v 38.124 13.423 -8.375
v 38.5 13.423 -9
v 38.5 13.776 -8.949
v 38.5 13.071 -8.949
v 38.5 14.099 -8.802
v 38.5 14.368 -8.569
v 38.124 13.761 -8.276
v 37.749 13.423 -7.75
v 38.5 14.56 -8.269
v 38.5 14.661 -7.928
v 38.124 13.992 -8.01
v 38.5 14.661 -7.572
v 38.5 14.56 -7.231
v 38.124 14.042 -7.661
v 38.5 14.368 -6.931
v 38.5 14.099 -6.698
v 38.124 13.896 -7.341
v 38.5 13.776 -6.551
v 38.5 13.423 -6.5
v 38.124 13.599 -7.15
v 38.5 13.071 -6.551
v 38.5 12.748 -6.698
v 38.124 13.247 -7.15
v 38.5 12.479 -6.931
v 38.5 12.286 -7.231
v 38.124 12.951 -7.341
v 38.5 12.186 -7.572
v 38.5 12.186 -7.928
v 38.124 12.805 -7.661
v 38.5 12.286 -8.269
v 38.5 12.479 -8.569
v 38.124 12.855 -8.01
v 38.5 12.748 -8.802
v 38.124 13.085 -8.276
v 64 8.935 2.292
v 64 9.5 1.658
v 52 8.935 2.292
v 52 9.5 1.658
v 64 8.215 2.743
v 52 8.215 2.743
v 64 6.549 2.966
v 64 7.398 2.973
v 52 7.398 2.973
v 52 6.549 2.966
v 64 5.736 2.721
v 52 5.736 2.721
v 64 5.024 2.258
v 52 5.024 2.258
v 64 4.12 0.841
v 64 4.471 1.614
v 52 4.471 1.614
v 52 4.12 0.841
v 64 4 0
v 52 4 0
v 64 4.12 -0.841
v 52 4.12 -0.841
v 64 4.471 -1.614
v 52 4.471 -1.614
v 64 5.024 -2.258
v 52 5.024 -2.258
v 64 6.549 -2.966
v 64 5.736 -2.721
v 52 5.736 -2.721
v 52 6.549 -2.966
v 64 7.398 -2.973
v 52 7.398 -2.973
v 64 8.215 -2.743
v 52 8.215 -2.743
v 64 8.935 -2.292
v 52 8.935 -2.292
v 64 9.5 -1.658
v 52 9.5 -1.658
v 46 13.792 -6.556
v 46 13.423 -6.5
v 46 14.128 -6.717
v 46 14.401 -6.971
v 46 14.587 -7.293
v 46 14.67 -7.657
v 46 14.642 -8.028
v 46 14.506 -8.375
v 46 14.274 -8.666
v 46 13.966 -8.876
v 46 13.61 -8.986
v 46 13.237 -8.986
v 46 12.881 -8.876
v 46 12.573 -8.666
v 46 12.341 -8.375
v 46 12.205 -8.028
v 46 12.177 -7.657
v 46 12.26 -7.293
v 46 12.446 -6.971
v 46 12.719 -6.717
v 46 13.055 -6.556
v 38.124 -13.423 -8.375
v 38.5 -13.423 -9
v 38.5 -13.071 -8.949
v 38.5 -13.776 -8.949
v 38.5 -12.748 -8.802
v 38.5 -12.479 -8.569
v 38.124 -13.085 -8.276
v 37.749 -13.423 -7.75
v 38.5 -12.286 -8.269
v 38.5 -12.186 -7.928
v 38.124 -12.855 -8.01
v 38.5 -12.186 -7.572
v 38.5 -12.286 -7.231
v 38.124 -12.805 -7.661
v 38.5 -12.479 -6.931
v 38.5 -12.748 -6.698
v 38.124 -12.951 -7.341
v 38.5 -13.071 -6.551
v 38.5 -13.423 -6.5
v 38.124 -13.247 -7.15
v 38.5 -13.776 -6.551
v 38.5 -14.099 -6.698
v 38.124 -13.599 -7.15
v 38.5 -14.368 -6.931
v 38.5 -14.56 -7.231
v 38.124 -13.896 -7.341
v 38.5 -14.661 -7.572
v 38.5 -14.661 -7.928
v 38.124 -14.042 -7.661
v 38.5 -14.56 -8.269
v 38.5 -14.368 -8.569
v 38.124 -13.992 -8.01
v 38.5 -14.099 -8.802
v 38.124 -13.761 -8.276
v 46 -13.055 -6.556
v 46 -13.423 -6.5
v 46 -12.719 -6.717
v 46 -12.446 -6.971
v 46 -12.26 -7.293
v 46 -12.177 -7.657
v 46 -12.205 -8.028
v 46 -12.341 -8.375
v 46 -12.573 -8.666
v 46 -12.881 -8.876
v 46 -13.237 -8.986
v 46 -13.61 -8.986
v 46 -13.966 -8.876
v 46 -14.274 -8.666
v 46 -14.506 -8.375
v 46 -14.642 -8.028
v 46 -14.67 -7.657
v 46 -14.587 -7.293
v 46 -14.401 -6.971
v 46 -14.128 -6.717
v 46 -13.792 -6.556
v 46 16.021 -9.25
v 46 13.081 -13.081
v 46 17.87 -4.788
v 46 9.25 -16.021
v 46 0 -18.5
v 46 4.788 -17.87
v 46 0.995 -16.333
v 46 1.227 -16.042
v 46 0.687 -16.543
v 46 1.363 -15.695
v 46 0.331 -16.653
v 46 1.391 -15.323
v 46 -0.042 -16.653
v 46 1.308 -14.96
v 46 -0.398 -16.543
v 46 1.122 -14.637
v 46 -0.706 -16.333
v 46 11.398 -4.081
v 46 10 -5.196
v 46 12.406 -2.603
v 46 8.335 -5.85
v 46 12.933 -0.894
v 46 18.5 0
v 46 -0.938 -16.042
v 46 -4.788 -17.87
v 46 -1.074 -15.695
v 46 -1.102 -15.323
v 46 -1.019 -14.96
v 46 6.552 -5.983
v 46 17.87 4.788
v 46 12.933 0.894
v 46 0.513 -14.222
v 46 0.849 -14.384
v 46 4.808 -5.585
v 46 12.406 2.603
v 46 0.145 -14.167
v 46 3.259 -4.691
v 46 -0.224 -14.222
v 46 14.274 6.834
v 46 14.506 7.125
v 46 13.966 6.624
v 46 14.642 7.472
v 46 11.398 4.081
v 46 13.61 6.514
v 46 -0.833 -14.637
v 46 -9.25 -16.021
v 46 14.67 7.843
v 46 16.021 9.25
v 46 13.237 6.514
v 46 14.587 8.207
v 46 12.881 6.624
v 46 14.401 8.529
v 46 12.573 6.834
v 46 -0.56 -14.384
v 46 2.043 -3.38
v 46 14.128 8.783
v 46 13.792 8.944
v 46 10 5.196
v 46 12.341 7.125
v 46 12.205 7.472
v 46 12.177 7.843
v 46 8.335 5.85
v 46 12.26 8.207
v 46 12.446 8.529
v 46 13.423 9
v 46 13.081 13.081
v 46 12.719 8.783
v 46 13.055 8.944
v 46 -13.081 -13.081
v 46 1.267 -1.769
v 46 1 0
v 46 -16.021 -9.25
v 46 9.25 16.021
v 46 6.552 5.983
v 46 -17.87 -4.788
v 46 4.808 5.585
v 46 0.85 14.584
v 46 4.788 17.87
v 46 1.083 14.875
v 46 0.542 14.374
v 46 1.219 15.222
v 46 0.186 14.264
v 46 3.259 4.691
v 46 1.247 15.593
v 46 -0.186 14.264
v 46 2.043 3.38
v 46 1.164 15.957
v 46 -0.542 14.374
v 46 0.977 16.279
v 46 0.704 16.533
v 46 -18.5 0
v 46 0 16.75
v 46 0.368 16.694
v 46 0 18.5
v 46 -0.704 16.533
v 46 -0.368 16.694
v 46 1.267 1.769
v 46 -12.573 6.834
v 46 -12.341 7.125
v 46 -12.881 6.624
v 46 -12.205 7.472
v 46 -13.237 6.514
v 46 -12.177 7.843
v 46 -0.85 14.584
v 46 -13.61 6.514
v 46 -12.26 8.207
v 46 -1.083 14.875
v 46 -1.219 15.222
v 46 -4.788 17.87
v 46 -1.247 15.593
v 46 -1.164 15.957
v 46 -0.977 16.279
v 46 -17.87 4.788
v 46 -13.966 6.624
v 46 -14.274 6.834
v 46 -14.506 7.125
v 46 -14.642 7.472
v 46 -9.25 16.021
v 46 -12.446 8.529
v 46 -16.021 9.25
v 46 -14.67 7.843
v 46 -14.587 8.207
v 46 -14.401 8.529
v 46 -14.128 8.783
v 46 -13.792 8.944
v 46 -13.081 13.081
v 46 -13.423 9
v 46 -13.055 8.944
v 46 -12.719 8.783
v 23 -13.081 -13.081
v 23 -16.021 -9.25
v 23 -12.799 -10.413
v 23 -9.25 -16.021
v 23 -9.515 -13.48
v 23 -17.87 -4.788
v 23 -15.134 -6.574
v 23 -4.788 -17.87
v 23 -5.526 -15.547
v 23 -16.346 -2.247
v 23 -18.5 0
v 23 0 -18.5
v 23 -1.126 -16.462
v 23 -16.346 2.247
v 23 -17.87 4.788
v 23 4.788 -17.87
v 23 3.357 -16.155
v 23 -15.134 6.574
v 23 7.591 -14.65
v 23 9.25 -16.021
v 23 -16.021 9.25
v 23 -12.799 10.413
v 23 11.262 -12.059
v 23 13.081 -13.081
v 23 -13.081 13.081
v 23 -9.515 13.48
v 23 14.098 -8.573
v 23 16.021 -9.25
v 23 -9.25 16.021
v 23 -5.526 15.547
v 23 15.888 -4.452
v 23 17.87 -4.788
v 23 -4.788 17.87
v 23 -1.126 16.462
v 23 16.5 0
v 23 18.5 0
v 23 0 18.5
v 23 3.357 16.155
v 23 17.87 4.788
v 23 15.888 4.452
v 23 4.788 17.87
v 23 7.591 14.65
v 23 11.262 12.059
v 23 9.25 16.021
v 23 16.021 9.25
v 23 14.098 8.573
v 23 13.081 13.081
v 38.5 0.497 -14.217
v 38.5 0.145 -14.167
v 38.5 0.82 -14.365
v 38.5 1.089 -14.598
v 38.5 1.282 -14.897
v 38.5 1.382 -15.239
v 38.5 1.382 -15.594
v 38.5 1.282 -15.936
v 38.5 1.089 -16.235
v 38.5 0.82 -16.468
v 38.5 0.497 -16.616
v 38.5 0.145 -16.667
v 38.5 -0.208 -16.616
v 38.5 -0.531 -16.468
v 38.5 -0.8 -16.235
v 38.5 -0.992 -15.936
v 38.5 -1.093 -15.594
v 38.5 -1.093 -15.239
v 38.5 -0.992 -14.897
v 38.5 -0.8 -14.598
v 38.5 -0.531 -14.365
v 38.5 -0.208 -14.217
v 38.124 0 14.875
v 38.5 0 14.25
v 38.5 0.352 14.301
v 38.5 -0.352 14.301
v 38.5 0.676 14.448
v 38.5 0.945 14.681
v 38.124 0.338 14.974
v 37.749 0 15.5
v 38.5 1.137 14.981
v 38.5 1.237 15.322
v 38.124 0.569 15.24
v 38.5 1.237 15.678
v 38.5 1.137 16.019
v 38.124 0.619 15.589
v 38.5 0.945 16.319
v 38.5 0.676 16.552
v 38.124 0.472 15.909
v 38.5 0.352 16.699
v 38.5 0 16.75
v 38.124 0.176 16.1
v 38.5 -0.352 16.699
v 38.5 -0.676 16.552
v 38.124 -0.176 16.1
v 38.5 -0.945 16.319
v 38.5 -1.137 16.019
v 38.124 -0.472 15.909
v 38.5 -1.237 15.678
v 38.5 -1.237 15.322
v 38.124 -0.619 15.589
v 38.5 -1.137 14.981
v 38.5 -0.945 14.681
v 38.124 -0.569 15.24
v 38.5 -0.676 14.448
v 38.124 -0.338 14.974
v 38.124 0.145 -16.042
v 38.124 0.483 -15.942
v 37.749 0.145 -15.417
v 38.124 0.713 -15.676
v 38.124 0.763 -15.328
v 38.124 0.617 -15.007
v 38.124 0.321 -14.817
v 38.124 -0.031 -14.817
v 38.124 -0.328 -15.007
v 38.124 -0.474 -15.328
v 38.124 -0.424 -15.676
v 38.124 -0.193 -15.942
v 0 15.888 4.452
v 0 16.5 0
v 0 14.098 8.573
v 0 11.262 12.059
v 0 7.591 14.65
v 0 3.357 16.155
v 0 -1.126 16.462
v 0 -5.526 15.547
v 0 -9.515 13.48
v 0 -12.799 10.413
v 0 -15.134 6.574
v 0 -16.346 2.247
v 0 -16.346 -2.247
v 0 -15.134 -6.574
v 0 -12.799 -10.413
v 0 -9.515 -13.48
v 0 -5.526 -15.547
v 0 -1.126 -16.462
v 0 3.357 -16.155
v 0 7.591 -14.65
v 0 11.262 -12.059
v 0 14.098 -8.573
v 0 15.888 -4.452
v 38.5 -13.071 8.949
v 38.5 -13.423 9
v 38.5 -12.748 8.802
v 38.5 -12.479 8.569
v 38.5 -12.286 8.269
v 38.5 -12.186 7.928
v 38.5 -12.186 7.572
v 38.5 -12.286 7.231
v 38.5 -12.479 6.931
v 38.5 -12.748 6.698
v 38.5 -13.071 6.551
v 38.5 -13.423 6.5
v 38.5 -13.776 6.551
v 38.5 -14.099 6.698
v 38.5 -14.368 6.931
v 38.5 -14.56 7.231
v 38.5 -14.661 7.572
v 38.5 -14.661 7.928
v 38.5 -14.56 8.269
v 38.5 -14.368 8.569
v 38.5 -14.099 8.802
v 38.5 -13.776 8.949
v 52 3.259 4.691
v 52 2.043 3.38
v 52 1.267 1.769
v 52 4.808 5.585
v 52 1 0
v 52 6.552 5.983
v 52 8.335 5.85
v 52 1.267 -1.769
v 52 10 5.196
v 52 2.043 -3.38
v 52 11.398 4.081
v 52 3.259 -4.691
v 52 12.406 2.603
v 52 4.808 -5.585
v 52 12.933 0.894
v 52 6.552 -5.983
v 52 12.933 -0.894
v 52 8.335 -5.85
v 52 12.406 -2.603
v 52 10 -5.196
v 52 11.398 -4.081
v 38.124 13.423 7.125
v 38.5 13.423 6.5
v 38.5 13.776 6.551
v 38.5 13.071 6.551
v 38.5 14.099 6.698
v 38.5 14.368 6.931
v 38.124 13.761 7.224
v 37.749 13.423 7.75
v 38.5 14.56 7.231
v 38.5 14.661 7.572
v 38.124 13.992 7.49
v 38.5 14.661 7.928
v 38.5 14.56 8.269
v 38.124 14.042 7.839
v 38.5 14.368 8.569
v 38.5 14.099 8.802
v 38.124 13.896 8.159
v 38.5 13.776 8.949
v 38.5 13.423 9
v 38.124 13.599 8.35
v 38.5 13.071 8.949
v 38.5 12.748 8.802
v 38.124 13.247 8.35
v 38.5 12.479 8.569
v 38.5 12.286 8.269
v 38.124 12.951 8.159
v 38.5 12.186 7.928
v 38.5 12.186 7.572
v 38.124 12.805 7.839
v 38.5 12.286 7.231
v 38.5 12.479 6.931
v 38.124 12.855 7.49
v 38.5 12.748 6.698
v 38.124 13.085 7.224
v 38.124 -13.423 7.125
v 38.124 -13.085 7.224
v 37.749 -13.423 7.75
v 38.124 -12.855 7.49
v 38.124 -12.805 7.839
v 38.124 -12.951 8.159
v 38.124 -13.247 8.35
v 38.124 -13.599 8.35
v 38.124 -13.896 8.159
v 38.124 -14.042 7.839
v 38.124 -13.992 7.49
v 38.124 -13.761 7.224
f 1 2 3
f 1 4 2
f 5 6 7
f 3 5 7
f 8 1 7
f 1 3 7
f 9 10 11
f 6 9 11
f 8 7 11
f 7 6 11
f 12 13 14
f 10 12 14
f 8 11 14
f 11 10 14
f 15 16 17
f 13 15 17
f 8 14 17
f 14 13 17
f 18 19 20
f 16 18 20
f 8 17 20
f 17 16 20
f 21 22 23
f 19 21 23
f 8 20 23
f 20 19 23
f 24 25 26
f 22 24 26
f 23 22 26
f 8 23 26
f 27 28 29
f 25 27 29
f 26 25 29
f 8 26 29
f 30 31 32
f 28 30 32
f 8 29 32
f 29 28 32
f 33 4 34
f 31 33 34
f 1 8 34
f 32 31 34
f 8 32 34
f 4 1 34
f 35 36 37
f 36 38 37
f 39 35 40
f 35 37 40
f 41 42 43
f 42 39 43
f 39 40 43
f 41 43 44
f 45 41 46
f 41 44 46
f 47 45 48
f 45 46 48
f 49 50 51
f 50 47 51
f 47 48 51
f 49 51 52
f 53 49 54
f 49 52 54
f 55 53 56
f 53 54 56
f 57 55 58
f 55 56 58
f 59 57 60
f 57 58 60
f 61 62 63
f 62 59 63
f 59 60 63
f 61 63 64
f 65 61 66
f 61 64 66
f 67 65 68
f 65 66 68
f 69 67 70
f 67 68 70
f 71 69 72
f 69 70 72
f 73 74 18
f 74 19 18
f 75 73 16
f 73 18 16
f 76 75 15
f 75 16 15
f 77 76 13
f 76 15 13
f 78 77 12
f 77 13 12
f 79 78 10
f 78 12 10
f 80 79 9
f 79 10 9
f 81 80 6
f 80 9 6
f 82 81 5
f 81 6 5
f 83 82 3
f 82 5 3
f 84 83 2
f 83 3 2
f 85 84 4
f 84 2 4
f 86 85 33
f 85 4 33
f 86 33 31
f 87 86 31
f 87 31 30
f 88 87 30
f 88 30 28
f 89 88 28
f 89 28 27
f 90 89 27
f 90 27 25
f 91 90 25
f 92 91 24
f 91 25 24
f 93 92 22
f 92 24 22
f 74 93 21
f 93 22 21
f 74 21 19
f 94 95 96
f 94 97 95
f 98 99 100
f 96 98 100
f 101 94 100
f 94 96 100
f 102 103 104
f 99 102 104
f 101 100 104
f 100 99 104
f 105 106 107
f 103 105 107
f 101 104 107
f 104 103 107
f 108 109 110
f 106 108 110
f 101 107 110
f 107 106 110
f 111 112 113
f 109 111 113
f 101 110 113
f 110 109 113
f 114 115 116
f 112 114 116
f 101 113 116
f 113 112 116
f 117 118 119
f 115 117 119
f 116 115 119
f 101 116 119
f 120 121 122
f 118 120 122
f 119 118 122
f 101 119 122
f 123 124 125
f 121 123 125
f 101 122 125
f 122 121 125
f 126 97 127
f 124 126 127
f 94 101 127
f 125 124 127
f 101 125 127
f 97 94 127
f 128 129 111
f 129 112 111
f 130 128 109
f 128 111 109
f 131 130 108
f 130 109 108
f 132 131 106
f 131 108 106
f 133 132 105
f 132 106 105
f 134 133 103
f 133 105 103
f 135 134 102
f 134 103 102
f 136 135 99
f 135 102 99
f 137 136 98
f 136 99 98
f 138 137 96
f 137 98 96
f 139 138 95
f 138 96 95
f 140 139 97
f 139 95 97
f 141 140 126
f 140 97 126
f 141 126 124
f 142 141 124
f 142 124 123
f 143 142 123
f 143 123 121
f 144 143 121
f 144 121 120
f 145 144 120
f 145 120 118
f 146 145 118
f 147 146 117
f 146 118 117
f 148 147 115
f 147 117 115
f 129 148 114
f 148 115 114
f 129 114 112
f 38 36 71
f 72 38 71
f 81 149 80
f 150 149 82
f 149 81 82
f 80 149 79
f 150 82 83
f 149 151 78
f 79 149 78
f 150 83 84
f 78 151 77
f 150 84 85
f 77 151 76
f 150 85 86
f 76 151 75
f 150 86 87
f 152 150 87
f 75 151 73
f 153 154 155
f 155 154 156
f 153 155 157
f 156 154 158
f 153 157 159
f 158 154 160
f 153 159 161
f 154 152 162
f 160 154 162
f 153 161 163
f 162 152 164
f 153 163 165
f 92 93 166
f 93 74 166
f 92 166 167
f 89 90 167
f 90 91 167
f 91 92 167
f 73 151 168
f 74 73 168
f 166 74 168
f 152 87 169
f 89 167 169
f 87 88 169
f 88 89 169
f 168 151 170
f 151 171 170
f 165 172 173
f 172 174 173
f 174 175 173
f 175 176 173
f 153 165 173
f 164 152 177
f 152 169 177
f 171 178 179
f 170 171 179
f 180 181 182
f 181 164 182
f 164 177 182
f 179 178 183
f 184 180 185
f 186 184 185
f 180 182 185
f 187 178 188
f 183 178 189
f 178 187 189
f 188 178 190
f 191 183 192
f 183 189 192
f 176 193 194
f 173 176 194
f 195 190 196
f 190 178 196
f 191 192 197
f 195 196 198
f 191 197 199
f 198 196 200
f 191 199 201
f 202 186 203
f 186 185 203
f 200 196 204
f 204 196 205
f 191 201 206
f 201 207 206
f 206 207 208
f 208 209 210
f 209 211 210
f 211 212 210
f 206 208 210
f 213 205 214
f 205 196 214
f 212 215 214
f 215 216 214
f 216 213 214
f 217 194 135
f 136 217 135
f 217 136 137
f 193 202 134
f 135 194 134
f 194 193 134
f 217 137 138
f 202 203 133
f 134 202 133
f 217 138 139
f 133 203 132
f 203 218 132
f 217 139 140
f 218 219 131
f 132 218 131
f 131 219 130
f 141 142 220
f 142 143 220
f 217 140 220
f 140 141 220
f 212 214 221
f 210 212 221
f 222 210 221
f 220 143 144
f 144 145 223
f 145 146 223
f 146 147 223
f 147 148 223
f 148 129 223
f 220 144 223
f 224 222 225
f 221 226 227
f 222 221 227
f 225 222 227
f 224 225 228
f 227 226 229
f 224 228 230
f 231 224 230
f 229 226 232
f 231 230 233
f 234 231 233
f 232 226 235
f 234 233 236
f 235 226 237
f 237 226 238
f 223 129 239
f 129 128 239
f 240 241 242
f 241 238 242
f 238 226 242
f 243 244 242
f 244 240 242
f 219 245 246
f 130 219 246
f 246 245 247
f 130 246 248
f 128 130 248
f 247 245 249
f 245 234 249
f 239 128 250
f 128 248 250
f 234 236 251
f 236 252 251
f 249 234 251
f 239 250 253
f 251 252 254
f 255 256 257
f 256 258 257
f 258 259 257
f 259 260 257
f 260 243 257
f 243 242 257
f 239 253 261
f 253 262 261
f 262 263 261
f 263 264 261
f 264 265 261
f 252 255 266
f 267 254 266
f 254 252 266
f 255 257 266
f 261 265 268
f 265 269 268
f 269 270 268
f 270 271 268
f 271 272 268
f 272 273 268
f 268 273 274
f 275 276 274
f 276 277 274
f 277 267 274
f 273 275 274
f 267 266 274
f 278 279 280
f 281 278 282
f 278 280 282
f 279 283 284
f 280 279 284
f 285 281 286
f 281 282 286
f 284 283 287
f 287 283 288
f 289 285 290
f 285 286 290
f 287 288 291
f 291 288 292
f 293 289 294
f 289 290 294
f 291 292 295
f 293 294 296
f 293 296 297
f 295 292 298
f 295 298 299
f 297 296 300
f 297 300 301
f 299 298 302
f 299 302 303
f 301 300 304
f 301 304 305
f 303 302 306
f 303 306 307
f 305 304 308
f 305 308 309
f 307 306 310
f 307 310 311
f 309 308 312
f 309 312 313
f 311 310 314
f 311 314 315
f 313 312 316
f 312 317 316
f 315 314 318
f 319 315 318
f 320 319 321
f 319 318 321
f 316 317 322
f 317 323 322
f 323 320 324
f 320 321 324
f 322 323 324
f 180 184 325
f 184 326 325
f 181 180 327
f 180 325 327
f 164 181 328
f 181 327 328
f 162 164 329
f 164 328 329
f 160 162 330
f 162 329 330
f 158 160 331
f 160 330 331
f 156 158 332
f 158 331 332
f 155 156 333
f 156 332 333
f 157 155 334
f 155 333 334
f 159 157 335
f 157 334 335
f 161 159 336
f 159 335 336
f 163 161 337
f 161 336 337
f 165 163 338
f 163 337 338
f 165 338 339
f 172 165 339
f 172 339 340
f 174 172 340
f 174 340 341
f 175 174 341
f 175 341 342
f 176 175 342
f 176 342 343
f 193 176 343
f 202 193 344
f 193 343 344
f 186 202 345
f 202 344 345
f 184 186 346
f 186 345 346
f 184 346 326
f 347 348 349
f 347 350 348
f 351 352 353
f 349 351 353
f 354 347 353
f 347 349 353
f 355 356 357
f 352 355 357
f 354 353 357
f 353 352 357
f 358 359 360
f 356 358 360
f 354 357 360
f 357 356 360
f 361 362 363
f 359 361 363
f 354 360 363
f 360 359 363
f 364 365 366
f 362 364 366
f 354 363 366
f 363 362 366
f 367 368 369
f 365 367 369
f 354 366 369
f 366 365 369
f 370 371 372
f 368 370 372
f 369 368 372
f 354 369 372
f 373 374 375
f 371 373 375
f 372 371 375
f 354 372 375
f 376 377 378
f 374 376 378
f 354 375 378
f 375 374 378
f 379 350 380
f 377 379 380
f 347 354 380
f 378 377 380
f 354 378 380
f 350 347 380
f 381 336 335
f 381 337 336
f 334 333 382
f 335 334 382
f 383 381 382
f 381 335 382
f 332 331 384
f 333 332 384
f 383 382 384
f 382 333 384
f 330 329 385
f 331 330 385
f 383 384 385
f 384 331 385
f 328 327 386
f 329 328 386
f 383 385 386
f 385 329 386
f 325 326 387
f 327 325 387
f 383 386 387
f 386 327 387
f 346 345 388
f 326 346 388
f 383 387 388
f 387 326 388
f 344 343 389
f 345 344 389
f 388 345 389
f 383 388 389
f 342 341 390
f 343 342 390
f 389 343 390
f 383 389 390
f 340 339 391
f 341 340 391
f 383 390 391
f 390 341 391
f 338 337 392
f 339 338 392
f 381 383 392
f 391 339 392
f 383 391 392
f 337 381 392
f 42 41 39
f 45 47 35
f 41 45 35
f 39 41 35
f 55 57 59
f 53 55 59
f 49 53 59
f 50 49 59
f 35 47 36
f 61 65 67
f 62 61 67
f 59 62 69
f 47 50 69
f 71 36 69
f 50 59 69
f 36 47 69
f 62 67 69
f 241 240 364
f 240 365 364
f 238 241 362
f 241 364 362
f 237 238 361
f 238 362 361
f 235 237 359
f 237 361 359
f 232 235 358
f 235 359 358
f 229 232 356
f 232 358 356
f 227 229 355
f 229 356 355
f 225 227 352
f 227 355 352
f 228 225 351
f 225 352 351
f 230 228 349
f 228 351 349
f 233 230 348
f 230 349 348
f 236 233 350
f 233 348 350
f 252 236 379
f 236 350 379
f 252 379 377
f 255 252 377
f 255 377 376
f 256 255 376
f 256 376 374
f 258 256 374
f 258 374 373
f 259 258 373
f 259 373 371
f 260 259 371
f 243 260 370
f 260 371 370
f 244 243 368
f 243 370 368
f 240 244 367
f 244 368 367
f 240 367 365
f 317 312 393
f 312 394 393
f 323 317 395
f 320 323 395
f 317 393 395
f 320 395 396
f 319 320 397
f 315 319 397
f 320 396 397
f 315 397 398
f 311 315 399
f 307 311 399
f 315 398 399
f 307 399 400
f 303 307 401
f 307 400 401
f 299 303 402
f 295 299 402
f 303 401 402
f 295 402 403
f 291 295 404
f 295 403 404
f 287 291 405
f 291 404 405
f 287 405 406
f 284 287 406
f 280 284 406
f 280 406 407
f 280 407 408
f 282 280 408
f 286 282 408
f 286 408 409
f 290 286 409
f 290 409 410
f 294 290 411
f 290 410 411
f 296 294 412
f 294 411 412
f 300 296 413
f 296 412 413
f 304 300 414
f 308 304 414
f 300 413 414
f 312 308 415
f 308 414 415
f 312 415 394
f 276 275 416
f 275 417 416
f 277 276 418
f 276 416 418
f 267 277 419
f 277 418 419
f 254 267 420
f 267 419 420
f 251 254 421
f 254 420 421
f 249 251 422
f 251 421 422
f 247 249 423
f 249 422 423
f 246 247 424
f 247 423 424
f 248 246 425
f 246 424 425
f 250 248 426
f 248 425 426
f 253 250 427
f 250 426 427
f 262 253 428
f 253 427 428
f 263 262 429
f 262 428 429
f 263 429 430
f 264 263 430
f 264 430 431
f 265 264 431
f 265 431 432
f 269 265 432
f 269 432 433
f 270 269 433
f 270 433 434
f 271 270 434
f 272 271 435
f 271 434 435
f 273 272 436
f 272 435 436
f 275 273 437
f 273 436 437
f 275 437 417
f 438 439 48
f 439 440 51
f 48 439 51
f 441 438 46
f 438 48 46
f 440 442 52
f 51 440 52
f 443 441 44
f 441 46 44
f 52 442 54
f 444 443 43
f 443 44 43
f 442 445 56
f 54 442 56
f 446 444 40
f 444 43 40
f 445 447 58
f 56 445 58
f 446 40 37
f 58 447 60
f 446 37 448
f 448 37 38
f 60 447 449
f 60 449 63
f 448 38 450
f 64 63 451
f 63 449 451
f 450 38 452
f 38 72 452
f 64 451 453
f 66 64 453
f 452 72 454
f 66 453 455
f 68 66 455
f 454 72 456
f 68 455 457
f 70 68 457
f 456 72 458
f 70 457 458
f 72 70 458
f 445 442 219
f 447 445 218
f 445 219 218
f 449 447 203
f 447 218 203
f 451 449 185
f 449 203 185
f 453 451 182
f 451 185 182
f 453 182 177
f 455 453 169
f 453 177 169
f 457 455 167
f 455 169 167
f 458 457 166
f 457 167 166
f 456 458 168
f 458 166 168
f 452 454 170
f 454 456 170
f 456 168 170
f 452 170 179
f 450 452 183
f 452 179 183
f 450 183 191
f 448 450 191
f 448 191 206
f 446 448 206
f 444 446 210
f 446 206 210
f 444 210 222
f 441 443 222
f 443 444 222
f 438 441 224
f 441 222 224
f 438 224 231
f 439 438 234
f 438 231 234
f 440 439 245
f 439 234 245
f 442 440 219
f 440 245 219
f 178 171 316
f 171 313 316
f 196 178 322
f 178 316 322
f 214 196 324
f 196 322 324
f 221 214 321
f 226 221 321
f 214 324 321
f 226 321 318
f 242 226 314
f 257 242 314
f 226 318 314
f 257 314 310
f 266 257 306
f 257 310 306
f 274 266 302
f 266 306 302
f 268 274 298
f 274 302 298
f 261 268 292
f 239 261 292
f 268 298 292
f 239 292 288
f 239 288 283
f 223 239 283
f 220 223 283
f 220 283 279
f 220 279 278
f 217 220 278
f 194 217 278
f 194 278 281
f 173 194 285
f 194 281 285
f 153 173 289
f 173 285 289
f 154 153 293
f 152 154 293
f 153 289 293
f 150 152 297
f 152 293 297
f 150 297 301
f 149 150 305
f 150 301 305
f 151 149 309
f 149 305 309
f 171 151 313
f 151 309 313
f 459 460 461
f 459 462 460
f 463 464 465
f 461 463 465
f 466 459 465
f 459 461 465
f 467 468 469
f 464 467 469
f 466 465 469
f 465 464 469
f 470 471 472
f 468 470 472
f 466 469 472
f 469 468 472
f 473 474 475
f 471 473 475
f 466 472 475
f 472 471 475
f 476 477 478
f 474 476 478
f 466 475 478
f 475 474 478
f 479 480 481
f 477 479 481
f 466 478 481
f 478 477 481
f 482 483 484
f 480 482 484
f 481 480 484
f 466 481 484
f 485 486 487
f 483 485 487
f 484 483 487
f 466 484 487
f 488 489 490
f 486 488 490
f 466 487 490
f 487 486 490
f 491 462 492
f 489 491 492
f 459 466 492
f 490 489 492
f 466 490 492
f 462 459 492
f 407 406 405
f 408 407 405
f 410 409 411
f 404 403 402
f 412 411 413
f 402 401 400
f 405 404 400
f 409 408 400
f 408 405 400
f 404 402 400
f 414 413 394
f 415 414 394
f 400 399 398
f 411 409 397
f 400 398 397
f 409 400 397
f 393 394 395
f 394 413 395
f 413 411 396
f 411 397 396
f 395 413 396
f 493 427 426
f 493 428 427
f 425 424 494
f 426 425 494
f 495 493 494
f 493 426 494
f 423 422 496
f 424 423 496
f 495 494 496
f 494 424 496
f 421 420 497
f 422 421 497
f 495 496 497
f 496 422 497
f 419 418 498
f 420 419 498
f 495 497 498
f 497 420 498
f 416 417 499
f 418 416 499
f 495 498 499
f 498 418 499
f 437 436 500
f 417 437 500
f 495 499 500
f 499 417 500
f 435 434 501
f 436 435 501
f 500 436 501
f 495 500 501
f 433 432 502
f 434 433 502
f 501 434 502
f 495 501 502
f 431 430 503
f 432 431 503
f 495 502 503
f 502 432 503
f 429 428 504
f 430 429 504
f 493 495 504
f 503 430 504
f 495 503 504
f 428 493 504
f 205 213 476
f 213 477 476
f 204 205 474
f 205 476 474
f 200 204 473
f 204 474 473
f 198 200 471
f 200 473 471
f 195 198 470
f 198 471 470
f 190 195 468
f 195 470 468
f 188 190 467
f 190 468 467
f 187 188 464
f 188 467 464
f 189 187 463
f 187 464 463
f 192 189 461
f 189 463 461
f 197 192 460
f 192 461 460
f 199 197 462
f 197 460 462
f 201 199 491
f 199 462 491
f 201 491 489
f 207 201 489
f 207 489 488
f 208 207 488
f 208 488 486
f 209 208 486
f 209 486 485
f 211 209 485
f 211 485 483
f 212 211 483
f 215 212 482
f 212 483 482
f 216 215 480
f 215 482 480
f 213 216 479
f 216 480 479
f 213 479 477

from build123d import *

# Parameters (mm, degrees)
SKETCH_3_W             = 11.653142641
SKETCH_3_H             = 0.953639491
CUT_EXTRUDE_1_DEPTH    = 12
HOLE_WIZARD_M3_1_D     = 2.5
HOLE_WIZARD_M3_1_DEPTH = 7.5
HOLE_WIZARD_M3_1_TIP   = 0.751075774


with BuildPart() as part:
    # 草图1 → 旋转1 (revolve)
    with BuildSketch(Plane.XY):
        Polygon((0, 0), (46, 0), (46, 18.5), (23, 18.5), (23, 16.5), (0, 16.5), align=None)
    revolve(axis=Axis((0, 0, 0), (1, 0, 0)))

    # 草图2 → 旋转2 (revolve)
    with BuildSketch(Plane.XY):
        Polygon((46, 7), (64, 7), (64, 4), (52, 4), (52, 1), (46, 1), align=None)
    revolve(axis=Axis((46, 7, 0), (1, 0, 0)))

    # 草图3 → 切除-拉伸1 (cut)
    with BuildSketch(Plane(origin=(64, 0, 0), x_dir=(0, 0, -1), z_dir=(1, 0, 0))):
        with Locations((-0.372215264, 9.976819746)):
            Rectangle(SKETCH_3_W, SKETCH_3_H)
    extrude(amount=-CUT_EXTRUDE_1_DEPTH, mode=Mode.SUBTRACT)

    # M3 螺纹孔1
    with Locations(Plane(origin=(46, 0, 0), x_dir=(0, 0, -1), z_dir=(1, 0, 0))):
        with Locations((-7.75, 13.423393759), (7.75, 13.423393759), (15.4165108, 0.144607536), (7.75, -13.423393759), (-7.75, -13.423393759), (-15.5, 0)):
            Hole(HOLE_WIZARD_M3_1_D / 2, depth=HOLE_WIZARD_M3_1_DEPTH)
            with Locations((0, 0, -(HOLE_WIZARD_M3_1_DEPTH + HOLE_WIZARD_M3_1_TIP / 2))):  # 118° drill point
                Cone(0, HOLE_WIZARD_M3_1_D / 2, HOLE_WIZARD_M3_1_TIP, mode=Mode.SUBTRACT)


solid = part.part
